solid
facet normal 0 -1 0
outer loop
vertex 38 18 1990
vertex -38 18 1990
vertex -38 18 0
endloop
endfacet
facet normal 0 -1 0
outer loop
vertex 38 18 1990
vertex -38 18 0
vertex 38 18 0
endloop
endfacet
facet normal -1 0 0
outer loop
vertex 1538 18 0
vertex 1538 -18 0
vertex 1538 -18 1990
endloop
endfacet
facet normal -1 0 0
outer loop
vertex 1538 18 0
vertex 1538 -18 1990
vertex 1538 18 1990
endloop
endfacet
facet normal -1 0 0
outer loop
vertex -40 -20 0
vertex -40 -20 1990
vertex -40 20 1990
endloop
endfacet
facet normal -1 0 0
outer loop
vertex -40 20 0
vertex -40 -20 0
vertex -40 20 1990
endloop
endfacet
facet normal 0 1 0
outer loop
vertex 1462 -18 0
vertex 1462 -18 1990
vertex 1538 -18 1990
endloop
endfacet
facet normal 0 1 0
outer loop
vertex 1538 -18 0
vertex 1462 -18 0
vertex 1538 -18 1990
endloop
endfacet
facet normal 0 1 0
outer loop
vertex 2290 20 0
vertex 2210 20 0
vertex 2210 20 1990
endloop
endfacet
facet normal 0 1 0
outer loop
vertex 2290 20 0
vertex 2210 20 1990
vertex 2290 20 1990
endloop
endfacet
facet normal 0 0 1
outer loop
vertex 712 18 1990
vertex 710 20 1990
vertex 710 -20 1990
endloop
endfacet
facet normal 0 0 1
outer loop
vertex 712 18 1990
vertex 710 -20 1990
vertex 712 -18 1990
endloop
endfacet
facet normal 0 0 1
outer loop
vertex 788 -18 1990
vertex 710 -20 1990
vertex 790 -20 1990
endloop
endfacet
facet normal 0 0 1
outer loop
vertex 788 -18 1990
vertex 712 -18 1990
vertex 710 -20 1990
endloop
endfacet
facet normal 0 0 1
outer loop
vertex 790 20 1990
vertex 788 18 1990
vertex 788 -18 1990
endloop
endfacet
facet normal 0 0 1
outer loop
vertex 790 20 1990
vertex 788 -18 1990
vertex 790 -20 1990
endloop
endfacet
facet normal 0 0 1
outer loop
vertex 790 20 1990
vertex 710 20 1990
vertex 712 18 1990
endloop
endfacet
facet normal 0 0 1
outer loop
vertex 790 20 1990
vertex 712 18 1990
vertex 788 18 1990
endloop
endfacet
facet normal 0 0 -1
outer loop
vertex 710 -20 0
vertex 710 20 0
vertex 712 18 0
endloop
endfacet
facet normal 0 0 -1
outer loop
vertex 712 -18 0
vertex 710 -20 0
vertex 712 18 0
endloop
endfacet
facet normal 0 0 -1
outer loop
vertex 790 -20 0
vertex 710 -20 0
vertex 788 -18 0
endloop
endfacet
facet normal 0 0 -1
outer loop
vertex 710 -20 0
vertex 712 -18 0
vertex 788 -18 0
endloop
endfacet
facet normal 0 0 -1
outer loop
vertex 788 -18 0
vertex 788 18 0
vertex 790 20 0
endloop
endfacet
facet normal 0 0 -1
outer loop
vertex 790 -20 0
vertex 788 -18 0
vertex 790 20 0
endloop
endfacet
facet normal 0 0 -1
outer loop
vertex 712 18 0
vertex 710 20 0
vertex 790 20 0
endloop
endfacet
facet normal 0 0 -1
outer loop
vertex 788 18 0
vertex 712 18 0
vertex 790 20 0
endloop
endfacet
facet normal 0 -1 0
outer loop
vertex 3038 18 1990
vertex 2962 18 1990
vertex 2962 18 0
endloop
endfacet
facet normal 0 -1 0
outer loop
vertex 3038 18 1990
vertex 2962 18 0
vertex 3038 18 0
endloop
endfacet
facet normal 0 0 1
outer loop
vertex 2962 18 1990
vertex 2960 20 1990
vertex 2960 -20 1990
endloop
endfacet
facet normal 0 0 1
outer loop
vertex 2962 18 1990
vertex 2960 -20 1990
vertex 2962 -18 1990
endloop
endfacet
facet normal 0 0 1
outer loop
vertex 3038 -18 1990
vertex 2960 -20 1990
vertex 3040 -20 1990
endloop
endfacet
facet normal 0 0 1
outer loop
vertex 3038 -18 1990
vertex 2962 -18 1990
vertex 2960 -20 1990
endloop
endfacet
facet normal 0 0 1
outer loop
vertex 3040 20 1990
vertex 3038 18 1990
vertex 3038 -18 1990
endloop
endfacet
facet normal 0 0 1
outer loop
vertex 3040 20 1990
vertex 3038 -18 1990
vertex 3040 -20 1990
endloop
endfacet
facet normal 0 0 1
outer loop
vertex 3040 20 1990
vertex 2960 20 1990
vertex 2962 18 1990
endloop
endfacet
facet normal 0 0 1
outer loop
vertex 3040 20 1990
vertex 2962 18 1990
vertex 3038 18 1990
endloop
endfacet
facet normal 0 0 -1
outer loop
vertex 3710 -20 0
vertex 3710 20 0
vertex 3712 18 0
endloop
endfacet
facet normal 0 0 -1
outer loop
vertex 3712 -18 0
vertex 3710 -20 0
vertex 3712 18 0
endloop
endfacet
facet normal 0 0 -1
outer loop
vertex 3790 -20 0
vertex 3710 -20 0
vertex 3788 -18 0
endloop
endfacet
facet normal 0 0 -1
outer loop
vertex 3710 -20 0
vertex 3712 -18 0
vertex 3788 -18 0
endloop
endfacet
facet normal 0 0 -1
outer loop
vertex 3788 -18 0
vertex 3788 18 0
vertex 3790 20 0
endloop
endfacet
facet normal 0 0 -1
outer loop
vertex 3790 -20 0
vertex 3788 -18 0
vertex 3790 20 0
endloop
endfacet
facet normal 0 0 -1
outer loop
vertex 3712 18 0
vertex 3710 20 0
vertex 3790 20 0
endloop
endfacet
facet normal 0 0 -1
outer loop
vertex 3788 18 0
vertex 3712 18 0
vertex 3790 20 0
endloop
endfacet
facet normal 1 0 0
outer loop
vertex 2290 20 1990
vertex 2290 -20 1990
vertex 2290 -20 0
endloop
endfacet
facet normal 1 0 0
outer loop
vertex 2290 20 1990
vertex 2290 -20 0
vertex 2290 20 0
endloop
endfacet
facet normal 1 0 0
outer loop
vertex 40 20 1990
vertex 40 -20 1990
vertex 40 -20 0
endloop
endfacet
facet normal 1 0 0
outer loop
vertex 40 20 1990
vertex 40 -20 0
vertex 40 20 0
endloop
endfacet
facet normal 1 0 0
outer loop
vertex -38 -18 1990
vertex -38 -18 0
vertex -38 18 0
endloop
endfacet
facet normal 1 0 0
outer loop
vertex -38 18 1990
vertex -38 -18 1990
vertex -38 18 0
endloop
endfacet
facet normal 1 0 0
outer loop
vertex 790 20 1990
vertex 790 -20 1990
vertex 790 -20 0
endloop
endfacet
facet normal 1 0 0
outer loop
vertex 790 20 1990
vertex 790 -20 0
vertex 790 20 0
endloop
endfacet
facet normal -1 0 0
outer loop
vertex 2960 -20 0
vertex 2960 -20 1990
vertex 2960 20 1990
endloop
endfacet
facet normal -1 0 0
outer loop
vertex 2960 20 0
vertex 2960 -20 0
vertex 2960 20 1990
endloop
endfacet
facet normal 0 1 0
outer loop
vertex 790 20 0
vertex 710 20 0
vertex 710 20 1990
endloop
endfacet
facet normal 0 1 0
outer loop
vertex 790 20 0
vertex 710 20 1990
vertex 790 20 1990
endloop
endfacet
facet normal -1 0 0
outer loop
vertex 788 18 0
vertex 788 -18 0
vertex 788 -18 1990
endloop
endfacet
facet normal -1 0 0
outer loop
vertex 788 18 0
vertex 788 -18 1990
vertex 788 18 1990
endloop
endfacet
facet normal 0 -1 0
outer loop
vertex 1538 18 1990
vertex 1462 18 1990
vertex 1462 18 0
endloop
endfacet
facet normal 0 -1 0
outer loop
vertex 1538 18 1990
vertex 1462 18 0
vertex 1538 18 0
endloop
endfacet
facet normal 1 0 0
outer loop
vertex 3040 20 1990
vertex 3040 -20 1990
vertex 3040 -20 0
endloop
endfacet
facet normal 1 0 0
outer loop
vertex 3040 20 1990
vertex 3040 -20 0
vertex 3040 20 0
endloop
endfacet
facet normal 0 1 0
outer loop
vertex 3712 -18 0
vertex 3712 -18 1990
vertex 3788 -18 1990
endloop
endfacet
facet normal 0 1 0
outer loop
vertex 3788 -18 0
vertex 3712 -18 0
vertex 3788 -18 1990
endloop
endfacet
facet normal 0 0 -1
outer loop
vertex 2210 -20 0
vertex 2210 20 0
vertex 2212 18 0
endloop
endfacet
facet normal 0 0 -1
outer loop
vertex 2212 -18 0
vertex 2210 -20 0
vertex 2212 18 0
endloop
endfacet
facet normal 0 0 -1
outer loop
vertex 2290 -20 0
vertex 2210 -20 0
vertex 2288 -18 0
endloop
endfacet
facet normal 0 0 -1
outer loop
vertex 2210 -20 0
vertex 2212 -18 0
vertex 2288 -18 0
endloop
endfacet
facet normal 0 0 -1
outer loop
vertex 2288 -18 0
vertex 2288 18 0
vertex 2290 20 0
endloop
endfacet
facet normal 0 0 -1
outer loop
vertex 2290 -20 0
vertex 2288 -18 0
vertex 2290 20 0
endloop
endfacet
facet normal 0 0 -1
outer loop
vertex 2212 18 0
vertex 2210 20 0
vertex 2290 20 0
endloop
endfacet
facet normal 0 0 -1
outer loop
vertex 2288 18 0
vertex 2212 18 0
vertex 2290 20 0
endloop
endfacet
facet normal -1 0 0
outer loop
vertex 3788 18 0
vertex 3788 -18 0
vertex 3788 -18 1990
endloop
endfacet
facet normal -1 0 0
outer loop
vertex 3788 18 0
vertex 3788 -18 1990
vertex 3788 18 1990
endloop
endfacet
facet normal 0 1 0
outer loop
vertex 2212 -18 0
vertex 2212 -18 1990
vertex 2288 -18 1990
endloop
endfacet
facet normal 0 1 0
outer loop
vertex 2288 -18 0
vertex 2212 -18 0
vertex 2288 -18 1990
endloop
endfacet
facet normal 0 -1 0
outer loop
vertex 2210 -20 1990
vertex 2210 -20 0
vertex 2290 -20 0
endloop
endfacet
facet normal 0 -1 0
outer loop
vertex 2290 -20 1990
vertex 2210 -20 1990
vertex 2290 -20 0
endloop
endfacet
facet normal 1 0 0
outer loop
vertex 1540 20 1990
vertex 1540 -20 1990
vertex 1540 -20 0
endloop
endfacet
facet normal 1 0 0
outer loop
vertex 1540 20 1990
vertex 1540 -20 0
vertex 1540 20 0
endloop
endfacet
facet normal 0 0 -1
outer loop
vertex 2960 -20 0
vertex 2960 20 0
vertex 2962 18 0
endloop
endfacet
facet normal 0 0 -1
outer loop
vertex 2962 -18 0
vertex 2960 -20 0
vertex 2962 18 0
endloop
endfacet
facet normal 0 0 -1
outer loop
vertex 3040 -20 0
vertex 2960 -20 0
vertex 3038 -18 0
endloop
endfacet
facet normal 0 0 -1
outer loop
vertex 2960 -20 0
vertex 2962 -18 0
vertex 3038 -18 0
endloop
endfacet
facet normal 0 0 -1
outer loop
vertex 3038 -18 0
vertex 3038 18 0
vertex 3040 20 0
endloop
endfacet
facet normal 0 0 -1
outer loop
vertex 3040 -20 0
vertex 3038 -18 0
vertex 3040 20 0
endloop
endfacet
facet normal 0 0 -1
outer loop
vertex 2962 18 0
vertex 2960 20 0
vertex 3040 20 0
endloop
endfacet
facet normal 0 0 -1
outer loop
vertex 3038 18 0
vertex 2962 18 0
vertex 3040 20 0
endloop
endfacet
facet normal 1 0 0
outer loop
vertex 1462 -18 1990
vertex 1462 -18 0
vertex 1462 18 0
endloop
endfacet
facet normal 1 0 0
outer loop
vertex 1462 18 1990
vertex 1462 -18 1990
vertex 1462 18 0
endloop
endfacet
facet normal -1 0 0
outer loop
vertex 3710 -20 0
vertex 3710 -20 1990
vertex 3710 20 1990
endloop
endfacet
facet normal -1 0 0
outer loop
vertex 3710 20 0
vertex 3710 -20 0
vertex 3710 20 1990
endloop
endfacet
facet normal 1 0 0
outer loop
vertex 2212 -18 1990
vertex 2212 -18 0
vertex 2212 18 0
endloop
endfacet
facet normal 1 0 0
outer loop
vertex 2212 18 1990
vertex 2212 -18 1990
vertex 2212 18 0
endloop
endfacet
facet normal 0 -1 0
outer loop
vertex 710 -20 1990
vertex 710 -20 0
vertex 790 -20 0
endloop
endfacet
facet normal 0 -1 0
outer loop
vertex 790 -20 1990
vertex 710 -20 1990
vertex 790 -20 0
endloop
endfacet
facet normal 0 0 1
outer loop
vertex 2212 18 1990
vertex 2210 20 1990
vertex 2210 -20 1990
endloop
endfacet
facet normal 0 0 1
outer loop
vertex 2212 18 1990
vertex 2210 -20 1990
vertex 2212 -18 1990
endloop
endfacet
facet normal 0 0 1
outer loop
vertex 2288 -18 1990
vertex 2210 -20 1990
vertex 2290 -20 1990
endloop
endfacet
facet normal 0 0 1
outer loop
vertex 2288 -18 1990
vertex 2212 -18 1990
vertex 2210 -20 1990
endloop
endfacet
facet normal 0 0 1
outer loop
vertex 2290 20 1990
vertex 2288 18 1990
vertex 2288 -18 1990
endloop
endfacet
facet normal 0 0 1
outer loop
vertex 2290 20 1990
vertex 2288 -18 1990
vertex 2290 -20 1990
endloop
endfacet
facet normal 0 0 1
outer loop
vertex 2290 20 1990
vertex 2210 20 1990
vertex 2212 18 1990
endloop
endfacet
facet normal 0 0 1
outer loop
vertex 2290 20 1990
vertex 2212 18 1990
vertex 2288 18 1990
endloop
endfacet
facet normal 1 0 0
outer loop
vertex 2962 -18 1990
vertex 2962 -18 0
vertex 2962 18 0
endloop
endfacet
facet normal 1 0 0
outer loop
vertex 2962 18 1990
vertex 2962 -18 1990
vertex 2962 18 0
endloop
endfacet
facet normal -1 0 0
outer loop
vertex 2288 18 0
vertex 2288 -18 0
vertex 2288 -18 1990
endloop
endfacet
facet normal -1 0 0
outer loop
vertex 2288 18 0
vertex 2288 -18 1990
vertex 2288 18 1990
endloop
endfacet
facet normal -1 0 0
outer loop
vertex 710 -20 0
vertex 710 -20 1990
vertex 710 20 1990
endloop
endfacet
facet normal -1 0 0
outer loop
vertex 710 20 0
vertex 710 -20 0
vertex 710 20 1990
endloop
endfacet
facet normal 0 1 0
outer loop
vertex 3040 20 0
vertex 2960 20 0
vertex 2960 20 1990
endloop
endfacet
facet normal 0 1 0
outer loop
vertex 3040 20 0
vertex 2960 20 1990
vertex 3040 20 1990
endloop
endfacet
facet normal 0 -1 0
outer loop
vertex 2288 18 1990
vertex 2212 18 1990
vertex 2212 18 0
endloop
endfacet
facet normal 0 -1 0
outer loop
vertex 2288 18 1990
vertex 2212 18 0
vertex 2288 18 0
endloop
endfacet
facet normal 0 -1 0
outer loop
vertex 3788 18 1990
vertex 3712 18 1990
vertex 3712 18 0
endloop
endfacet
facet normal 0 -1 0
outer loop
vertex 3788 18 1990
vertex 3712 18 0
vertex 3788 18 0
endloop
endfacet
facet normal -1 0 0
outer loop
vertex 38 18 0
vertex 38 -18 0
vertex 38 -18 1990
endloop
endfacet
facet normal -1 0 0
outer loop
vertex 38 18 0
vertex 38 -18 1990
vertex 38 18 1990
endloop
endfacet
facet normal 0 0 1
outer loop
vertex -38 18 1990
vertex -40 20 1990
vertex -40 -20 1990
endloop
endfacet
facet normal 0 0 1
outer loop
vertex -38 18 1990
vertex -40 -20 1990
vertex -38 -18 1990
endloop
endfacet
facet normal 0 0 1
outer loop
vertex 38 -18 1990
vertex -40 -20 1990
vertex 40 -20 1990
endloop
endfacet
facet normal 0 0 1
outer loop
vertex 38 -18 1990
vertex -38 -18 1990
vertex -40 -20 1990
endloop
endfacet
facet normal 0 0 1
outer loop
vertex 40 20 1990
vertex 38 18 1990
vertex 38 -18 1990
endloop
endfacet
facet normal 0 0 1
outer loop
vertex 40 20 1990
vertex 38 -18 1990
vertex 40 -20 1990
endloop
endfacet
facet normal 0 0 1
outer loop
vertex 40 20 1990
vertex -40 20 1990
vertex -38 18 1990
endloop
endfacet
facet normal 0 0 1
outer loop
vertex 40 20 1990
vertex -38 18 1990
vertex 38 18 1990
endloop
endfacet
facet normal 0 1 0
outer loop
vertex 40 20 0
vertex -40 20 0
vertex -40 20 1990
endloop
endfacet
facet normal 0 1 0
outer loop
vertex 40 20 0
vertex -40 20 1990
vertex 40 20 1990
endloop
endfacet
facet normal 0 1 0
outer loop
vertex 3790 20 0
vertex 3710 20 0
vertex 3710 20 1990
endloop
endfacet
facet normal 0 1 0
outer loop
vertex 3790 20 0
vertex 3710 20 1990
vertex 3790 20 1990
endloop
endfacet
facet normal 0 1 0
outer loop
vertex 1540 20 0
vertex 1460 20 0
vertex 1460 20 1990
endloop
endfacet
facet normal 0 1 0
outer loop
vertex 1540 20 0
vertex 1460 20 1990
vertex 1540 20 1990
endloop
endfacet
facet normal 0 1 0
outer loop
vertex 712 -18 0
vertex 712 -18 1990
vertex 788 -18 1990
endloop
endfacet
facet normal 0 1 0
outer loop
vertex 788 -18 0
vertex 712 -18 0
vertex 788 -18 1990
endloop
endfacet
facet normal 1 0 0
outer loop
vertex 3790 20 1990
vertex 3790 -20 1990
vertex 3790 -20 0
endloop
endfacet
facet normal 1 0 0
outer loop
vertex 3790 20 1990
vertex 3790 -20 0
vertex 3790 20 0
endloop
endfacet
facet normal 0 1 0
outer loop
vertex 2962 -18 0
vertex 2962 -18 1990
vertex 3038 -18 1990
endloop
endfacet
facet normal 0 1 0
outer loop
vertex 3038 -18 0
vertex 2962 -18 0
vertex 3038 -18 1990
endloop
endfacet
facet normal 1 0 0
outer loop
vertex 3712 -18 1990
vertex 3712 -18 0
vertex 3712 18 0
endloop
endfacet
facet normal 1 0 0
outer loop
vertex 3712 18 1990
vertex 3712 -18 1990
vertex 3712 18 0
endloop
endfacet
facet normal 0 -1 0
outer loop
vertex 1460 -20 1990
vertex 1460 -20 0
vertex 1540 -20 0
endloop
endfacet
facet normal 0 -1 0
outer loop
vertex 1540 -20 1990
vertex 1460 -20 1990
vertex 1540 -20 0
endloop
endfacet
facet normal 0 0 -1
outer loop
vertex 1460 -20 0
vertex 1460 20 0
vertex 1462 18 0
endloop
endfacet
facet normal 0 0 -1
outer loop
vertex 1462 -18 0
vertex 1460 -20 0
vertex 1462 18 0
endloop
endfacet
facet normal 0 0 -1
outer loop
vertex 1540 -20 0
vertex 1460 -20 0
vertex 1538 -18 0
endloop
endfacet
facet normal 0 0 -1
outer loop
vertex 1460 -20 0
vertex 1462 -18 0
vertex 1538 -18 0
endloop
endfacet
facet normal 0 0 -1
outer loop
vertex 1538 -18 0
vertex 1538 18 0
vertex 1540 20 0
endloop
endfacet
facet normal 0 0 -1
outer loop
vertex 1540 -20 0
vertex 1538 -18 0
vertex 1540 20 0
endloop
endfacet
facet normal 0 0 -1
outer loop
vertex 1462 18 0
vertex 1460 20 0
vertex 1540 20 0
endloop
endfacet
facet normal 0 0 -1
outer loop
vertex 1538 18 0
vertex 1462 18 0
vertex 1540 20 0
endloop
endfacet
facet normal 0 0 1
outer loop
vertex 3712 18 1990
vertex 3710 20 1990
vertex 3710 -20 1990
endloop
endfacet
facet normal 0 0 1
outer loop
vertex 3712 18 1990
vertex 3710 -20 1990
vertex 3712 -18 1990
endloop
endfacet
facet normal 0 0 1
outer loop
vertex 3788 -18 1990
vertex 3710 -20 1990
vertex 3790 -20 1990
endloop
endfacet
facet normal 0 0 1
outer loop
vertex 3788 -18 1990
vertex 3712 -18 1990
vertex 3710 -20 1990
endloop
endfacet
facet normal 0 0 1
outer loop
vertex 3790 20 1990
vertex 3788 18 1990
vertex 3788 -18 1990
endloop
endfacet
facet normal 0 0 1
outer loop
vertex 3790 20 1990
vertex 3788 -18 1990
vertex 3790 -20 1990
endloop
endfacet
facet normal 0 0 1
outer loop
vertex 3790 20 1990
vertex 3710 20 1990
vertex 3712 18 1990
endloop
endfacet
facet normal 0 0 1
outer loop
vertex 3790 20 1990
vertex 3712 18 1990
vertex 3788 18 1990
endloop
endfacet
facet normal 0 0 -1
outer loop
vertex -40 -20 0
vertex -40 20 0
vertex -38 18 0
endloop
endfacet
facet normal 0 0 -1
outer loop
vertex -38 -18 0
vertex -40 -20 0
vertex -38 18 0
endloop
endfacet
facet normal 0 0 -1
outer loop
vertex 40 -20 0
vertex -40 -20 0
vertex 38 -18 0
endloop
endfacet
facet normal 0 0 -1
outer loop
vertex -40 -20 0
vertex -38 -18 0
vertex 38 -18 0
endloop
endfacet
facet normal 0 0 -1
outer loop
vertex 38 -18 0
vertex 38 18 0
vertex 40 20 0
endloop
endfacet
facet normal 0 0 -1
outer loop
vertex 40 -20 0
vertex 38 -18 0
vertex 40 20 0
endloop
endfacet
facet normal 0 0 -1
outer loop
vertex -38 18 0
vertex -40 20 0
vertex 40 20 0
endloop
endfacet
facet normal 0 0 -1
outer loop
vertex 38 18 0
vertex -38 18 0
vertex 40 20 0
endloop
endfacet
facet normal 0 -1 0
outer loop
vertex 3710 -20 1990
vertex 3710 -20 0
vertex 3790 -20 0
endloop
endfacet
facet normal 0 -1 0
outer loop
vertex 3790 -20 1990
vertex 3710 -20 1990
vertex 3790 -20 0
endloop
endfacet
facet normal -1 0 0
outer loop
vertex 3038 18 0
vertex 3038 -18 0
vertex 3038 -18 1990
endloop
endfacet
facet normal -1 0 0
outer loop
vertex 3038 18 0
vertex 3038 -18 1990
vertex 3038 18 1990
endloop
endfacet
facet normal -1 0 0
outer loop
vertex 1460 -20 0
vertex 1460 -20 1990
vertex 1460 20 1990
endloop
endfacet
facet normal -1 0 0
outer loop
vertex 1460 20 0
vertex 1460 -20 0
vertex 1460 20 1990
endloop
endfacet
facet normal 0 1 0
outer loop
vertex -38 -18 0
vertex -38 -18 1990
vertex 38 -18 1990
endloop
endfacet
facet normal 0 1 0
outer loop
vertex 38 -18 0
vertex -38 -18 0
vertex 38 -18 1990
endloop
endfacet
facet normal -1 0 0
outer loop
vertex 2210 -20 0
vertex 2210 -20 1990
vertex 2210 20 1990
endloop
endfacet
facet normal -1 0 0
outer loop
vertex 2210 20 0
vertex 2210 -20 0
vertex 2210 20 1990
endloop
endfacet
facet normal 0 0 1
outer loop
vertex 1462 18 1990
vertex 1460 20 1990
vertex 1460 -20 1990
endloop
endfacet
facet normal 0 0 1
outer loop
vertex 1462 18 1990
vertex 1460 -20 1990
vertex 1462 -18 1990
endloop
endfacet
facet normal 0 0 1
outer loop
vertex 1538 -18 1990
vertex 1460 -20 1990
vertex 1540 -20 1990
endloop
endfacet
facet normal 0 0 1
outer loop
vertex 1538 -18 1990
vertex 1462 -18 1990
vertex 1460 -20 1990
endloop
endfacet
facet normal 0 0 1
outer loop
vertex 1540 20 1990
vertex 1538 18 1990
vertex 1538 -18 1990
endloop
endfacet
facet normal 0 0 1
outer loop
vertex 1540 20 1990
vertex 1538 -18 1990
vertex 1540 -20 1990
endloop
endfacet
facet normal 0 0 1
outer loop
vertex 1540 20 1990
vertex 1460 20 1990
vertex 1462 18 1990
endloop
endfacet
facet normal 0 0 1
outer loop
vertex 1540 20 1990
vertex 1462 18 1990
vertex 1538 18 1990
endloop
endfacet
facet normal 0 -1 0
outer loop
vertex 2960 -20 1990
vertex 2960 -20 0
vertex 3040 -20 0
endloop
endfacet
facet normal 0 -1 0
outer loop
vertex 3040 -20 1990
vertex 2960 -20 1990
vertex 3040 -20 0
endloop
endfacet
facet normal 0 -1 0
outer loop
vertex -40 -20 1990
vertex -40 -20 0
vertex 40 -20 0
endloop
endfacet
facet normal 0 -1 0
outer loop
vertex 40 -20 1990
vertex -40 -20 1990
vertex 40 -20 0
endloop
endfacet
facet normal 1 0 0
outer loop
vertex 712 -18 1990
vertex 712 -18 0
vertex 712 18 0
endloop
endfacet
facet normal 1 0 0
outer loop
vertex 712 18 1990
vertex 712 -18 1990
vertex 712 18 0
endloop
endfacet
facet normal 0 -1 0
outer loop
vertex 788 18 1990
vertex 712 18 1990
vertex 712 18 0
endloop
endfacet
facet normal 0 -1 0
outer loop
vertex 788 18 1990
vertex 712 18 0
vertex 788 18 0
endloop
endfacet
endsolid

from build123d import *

# Parameters (mm, degrees)
F0_W     = 80
F0_H     = 40
F0_W_2   = 76
F0_H_2   = 36
F1_DEPTH = 1990


with BuildPart() as f1:
    # F0 (on Top) → F1 (new body)
    with BuildSketch(Plane.XY):
        Rectangle(F0_W, F0_H)
        Rectangle(F0_W_2, F0_H_2, mode=Mode.SUBTRACT)
        with Locations((750, 0)):
            Rectangle(F0_W, F0_H)
        with Locations((750, 0)):
            Rectangle(F0_W_2, F0_H_2, mode=Mode.SUBTRACT)
        with Locations((1500, 0)):
            Rectangle(F0_W, F0_H)
        with Locations((1500, 0)):
            Rectangle(F0_W_2, F0_H_2, mode=Mode.SUBTRACT)
        with Locations((2250, 0)):
            Rectangle(F0_W, F0_H)
        with Locations((2250, 0)):
            Rectangle(F0_W_2, F0_H_2, mode=Mode.SUBTRACT)
        with Locations((3000, 0)):
            Rectangle(F0_W, F0_H)
        with Locations((3000, 0)):
            Rectangle(F0_W_2, F0_H_2, mode=Mode.SUBTRACT)
        with Locations((3750, 0)):
            Rectangle(F0_W, F0_H)
        with Locations((3750, 0)):
            Rectangle(F0_W_2, F0_H_2, mode=Mode.SUBTRACT)
    extrude(amount=F1_DEPTH)


solid = f1.part
